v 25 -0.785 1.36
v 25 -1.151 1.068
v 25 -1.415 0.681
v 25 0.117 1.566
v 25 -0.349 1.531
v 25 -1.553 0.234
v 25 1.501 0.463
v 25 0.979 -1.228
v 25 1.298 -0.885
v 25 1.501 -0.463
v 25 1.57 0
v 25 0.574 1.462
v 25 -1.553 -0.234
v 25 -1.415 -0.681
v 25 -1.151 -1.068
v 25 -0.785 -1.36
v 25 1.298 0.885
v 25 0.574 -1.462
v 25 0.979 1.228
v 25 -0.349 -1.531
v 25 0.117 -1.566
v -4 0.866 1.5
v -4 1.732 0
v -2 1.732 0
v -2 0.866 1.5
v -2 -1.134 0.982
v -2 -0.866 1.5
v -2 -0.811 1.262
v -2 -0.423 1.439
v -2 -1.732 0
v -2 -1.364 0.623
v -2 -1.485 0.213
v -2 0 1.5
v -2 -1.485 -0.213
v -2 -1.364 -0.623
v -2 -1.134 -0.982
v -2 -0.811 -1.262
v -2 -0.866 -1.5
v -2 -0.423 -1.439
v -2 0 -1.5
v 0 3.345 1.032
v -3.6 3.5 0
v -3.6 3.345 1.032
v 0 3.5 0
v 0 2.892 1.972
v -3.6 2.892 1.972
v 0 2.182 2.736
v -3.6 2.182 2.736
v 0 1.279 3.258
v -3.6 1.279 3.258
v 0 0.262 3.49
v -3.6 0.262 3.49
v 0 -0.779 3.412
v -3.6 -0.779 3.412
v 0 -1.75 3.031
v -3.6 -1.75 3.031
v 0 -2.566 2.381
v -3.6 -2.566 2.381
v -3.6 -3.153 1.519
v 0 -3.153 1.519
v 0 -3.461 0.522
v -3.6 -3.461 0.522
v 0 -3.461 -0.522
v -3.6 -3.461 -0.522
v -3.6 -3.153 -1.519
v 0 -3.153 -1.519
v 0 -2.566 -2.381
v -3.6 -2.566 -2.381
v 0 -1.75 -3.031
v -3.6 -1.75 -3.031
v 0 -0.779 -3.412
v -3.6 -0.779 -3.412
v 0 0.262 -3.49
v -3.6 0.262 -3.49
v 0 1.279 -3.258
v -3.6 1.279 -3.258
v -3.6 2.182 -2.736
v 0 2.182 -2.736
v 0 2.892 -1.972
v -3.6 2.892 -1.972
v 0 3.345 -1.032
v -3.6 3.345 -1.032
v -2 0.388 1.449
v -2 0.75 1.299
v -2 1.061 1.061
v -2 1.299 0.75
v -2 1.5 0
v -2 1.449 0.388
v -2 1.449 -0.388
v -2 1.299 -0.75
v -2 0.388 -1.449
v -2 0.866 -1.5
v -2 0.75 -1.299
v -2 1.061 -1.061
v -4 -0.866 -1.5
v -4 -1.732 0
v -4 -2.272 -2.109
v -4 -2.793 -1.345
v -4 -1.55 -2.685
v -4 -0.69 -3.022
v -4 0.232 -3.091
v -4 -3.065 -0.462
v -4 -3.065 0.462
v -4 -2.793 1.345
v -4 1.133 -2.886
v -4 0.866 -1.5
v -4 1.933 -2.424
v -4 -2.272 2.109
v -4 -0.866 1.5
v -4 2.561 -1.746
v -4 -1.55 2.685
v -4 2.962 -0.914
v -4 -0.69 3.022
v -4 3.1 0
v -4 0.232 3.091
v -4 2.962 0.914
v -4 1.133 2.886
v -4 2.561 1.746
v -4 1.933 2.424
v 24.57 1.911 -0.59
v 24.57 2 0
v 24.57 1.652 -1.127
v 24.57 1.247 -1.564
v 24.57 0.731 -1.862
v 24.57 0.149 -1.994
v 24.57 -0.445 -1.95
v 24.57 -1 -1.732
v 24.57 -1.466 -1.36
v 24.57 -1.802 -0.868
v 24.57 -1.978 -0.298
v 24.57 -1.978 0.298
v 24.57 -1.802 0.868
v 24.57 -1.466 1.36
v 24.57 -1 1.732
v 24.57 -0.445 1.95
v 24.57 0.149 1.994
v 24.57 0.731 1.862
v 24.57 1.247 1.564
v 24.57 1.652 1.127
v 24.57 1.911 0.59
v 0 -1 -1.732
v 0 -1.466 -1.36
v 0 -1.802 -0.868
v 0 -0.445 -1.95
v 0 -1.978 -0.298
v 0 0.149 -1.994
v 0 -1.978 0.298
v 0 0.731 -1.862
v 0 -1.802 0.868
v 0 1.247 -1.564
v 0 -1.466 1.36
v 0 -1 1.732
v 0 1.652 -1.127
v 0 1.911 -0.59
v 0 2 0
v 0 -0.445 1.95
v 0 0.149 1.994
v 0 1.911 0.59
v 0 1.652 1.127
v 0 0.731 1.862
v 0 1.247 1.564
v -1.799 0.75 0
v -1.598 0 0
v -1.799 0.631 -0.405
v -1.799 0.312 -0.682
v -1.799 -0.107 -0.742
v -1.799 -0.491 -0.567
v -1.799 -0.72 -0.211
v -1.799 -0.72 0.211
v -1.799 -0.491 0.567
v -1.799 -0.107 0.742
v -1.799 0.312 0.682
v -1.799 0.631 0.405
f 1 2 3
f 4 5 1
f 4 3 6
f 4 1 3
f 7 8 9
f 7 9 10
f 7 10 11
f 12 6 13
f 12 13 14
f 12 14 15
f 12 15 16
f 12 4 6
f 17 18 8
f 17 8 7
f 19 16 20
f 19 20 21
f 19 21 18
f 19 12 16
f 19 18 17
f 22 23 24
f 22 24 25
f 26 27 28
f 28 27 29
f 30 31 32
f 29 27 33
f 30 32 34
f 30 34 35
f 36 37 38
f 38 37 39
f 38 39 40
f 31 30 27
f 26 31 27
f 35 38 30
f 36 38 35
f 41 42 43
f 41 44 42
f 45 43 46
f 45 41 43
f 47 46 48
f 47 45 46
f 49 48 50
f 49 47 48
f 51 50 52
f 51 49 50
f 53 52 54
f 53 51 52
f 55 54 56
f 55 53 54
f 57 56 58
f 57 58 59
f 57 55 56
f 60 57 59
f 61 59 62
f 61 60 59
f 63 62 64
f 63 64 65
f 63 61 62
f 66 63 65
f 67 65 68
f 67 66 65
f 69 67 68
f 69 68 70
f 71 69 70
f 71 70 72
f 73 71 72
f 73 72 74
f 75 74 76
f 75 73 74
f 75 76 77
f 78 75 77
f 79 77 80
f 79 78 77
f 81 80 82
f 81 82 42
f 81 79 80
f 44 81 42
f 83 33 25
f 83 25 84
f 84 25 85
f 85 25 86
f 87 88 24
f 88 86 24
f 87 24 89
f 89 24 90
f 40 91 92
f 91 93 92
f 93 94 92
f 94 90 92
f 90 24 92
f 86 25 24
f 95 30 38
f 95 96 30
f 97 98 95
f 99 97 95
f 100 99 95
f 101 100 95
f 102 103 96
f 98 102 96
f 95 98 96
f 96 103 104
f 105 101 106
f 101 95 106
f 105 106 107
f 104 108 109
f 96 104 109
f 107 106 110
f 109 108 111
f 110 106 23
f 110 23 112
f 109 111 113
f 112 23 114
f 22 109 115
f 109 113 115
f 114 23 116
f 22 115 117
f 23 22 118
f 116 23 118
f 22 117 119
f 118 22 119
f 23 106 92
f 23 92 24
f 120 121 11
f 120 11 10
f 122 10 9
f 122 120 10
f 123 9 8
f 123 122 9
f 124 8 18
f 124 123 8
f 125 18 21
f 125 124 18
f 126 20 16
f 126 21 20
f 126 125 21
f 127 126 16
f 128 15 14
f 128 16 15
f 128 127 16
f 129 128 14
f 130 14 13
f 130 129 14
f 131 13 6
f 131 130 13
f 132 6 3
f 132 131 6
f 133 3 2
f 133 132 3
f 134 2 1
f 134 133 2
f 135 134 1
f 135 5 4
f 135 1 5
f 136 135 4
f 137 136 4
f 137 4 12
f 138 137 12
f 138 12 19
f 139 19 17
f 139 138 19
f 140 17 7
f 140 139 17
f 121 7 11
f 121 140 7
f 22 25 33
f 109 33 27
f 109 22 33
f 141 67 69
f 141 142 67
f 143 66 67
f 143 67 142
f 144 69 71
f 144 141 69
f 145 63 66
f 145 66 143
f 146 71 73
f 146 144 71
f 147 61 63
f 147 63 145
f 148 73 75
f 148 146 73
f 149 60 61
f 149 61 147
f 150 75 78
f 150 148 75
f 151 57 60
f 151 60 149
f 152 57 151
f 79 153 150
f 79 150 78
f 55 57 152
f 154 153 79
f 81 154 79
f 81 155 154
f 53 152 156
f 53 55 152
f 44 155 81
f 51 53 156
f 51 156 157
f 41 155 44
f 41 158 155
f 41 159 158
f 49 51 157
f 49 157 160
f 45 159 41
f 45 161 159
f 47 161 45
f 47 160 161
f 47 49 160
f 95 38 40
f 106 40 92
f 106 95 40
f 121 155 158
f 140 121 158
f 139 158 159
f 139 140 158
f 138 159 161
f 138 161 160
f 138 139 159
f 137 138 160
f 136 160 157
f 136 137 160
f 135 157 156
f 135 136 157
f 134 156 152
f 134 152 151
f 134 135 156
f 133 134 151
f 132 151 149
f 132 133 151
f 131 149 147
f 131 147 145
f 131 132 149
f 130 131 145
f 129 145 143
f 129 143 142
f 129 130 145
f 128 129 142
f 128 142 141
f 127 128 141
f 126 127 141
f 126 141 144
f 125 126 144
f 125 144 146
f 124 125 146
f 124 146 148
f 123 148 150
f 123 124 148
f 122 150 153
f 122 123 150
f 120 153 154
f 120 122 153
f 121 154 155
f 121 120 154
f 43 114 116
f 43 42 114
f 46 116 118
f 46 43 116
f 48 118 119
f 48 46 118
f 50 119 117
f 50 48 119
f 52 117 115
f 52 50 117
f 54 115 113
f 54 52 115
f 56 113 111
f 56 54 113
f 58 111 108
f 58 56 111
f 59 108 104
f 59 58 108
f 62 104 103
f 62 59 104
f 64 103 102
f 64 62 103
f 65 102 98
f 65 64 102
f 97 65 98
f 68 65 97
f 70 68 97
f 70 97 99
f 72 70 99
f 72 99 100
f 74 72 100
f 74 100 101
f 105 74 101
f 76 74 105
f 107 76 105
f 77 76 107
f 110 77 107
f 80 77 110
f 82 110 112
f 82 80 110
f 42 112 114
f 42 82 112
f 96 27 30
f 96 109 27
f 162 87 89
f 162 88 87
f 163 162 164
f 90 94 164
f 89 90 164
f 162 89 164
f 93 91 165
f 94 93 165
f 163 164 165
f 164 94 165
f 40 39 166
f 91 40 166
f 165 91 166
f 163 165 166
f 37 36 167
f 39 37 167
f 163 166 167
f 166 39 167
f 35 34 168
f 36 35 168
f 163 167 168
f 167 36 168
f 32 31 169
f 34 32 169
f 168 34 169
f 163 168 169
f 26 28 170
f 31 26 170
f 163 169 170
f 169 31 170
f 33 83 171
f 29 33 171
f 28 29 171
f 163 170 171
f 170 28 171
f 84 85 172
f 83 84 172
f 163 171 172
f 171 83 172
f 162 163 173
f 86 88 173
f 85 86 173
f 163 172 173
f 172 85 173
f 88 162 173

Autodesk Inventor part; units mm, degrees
sketch "Sketch_1" plane through (0, 0, 0) normal (0, 0, 1) x (1, 0, 0)
  line L0 (25, 0) -> (-4, 0)
  line L1 (-4, 0) -> (-4, 3.1)
  line L2 (-4, 3.1) -> (-3.6, 3.5)
  line L3 (-3.6, 3.5) -> (0, 3.5)
  line L4 (0, 3.5) -> (0, 2)
  line L5 (0, 2) -> (24.5705, 2)
  line L6 (24.5705, 2) -> (25, 1.5705)
  line L7 (25, 1.5705) -> (25, 0)
  line L8 (25, 0) -> (-4, 0)
revolve "Revolution1" add sketch "Sketch_1" angle 360 about axis through (25, 0, 0) along (1, 0, 0)
thread "Thread1" size "M4x0.7" class "6g" standard "ISO Metric profile" length 24 offset 1
sketch "Sketch_4_ALT_Drilling_1" plane through (0, 0, 0) normal (0, 0, 1) x (1, 0, 0)
  line L0 (-1.5981, 0) -> (-4, 0)
  line L1 (-4, 0) -> (-4, 1.5)
  line L2 (-4, 1.5) -> (-2, 1.5)
  line L3 (-2, 1.5) -> (-1.5981, 0)
  line L4 (-1.5981, 0) -> (-4, 0)
revolve "Revolution2" cut sketch "Sketch_4_ALT_Drilling_1" angle 360 about axis through (-1.5981, 0, 0) along (1, 0, 0)
sketch "Sketch_3" plane through (-4, 0, 0) normal (1, 0, 0) x (0, 0, -1)
  line L0 (-1.5, -0.866) -> (0, -1.7321)
  line L1 (0, -1.7321) -> (1.5, -0.866)
  line L2 (1.5, -0.866) -> (1.5, 0.866)
  line L3 (1.5, 0.866) -> (0, 1.7321)
  line L4 (0, 1.7321) -> (-1.5, 0.866)
  line L5 (-1.5, 0.866) -> (-1.5, -0.866)
extrude "Extrusion1" cut sketch "Sketch_3" along normal blind 2
ref_plane "bolt_to_nut_XY" through (25, 0, 0) normal (1, 0, 0) x (0, 0, -1)
ref_plane "bolt_to_nut_YZ" through (25, 0, 0) normal (0, 0, -1) x (0, 1, 0)
ref_plane "bolt_to_nut_ZX" through (25, 0, 0) normal (0, 1, 0) x (1, 0, 0)
ref_plane "screw1_XY" through (0, 0, 0) normal (1, 0, 0) x (0, 0, -1)
ref_plane "screw1_YZ" through (0, 0, 0) normal (0, 0, -1) x (0, 1, 0)
ref_plane "screw1_ZX" through (0, 0, 0) normal (0, 1, 0) x (1, 0, 0)
properties part number "CB4-25" material "鋼、炭素鋼"
